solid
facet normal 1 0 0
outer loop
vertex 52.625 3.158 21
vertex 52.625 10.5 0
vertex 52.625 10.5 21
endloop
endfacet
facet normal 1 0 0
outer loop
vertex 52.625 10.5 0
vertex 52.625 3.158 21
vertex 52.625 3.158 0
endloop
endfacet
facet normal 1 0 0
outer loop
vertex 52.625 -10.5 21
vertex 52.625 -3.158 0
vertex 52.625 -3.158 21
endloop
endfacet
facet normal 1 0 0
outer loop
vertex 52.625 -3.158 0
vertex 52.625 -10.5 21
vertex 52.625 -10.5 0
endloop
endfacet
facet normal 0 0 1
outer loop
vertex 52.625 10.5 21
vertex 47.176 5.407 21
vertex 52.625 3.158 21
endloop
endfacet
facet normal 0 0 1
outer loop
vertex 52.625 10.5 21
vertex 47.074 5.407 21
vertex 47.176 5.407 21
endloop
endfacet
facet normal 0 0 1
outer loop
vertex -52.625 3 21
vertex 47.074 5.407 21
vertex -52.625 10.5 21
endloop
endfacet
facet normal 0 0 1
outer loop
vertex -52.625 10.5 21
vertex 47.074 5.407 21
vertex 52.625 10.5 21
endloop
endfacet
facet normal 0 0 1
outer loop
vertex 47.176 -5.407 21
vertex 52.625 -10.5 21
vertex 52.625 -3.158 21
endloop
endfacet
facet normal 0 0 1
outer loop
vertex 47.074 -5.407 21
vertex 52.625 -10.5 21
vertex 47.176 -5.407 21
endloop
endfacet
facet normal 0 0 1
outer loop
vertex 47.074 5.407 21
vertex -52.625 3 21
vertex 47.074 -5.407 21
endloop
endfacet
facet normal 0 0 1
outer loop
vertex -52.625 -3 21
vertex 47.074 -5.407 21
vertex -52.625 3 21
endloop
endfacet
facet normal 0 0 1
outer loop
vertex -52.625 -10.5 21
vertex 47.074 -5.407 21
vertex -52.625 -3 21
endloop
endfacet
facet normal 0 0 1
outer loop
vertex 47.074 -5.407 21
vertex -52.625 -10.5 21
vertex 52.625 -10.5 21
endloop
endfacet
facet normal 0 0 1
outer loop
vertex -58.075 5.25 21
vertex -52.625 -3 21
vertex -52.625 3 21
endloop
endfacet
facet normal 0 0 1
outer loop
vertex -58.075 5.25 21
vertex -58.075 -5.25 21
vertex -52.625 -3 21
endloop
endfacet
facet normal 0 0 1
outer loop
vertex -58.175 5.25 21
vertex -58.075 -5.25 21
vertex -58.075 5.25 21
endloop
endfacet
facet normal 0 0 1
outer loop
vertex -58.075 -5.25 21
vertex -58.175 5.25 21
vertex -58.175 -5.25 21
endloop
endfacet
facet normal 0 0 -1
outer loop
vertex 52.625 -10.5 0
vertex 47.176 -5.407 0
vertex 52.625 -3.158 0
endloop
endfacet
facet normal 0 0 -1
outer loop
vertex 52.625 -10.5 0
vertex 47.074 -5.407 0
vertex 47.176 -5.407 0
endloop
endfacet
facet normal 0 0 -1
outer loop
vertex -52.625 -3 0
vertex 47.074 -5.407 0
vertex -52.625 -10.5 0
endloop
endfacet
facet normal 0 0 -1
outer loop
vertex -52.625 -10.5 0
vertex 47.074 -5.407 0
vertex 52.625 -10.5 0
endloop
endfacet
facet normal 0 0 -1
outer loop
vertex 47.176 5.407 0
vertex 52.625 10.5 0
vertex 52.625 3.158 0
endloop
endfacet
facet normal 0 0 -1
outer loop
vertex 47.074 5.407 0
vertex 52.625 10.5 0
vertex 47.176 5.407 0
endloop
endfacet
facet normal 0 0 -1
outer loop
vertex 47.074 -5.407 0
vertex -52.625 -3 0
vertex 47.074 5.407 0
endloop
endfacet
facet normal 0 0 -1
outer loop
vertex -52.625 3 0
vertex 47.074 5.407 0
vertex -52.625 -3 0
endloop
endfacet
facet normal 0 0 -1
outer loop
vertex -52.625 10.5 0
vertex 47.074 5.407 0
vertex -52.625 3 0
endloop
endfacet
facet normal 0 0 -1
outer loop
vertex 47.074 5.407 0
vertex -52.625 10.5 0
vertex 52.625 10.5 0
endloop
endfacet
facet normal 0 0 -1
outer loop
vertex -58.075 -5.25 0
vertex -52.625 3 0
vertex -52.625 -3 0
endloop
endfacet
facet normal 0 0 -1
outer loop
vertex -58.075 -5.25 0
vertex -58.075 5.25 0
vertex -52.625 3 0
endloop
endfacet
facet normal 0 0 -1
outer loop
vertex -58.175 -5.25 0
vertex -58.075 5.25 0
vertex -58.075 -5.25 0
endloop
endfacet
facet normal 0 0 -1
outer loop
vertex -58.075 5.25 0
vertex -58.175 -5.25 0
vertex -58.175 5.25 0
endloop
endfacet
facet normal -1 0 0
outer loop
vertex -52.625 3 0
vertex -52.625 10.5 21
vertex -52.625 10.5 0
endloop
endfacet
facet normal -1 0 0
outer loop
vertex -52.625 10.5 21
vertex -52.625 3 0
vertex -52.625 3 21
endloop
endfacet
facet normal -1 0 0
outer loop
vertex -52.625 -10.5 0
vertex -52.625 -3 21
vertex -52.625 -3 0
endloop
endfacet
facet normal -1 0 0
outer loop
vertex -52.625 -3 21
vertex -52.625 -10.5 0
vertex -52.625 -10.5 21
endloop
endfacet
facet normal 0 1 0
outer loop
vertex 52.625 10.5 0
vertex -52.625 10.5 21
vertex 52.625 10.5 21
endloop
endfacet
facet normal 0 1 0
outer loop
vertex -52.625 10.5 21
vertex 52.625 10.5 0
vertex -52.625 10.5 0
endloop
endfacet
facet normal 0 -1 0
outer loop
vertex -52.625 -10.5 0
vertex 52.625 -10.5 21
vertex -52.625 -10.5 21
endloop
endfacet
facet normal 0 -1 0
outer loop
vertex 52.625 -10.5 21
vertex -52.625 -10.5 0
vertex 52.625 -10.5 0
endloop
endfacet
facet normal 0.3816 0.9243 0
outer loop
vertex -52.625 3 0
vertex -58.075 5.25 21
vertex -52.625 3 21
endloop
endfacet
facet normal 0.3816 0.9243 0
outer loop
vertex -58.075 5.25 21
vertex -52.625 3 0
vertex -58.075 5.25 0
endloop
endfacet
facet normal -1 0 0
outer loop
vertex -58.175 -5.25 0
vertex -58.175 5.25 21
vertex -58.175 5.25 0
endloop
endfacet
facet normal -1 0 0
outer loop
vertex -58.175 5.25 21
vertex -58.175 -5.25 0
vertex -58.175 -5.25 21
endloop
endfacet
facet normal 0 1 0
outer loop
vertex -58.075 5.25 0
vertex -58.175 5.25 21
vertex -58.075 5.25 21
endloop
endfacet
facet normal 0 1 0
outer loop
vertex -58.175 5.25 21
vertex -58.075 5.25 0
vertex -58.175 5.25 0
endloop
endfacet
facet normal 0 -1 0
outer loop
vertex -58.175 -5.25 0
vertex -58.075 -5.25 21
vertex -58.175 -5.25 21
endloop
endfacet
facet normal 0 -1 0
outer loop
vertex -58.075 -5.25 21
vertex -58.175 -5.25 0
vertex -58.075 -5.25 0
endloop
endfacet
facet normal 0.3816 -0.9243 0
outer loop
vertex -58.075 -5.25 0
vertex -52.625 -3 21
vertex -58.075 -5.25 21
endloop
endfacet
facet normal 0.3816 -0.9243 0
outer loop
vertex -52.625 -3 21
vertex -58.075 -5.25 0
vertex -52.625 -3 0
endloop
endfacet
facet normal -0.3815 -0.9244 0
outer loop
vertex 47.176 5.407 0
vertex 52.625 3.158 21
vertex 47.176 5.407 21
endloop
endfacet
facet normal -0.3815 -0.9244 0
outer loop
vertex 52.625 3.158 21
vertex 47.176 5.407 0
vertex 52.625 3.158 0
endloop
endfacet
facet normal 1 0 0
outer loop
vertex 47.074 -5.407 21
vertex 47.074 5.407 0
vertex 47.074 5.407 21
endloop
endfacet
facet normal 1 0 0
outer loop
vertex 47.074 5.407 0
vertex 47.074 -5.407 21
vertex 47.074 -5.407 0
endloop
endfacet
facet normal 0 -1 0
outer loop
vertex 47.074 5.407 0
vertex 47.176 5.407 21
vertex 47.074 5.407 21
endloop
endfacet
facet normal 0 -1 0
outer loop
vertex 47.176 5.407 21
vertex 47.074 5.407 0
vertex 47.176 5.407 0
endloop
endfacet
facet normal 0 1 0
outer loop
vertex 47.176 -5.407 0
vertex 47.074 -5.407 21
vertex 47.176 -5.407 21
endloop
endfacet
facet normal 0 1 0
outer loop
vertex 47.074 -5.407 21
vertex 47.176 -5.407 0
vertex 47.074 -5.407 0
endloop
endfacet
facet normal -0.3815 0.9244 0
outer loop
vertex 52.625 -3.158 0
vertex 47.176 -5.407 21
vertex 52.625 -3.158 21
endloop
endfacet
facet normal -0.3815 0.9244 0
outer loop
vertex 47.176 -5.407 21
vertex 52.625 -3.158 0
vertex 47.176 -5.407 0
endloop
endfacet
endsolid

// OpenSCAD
$fn=70;

entranceWidth=421;
entranceHeight=21;
entranceDepth=entranceHeight;

module quaterPiece(pinOut,pinIn) {
    
    pieceWidth=entranceWidth/4;
    
    module body() {
        
        translate([0,0,entranceHeight/2]) {
            cube([pieceWidth,entranceDepth,entranceHeight], center=true);
        }
    }

    module pin() {
        translate([0,0,(entranceHeight/2)]) {
            hull() {
                cube([0.1,entranceDepth/2,entranceHeight], center=true);
                translate([4,0,0]) {
                    cube([3,6,entranceHeight], center=true);
                }
            }
        }
    }
    
    difference() {
        union() {
            body();
            if (pinOut == true) {
                translate([-(pieceWidth/2)-5.5,0,0]) {
                    pin();
                }
            }
        }
        
        if (pinIn == true) {
            translate([(pieceWidth/2)-5.5,0,0]) {
                scale([1.03,1.03,1]) {
                    pin();
                }
            }
        }
    }
    
    
    
}

quaterPiece(true, true);

module singleSquare() {
    module hole() {
        translate([0,0,8/2]) {
            cube([8,entranceDepth,8], center=true);
        }
    }
    
    difference() {
        quaterPiece(true, true);
        hole();
    }
}

module singleRound() {
    module hole() {
        translate([0,entranceDepth/2,0]) {
            rotate([90,0,0]) {
                cylinder(d=16, h=entranceDepth);
            }
        }
    }
    
    difference() {
        quaterPiece(true, true);
        hole();
    }
}

module wide() {
    module hole() {
        translate([0,entranceDepth/2,0]) {
            hull() {
                translate([-30,0,0]) rotate([90,0,0]) cylinder(r=entranceHeight/2, h=entranceDepth);
                translate([30,0,0]) rotate([90,0,0]) cylinder(r=entranceHeight/2, h=entranceDepth);
            }
        }
    }
    
    difference() {
        quaterPiece(true, true);
        hole();
    }
}

//wide();
